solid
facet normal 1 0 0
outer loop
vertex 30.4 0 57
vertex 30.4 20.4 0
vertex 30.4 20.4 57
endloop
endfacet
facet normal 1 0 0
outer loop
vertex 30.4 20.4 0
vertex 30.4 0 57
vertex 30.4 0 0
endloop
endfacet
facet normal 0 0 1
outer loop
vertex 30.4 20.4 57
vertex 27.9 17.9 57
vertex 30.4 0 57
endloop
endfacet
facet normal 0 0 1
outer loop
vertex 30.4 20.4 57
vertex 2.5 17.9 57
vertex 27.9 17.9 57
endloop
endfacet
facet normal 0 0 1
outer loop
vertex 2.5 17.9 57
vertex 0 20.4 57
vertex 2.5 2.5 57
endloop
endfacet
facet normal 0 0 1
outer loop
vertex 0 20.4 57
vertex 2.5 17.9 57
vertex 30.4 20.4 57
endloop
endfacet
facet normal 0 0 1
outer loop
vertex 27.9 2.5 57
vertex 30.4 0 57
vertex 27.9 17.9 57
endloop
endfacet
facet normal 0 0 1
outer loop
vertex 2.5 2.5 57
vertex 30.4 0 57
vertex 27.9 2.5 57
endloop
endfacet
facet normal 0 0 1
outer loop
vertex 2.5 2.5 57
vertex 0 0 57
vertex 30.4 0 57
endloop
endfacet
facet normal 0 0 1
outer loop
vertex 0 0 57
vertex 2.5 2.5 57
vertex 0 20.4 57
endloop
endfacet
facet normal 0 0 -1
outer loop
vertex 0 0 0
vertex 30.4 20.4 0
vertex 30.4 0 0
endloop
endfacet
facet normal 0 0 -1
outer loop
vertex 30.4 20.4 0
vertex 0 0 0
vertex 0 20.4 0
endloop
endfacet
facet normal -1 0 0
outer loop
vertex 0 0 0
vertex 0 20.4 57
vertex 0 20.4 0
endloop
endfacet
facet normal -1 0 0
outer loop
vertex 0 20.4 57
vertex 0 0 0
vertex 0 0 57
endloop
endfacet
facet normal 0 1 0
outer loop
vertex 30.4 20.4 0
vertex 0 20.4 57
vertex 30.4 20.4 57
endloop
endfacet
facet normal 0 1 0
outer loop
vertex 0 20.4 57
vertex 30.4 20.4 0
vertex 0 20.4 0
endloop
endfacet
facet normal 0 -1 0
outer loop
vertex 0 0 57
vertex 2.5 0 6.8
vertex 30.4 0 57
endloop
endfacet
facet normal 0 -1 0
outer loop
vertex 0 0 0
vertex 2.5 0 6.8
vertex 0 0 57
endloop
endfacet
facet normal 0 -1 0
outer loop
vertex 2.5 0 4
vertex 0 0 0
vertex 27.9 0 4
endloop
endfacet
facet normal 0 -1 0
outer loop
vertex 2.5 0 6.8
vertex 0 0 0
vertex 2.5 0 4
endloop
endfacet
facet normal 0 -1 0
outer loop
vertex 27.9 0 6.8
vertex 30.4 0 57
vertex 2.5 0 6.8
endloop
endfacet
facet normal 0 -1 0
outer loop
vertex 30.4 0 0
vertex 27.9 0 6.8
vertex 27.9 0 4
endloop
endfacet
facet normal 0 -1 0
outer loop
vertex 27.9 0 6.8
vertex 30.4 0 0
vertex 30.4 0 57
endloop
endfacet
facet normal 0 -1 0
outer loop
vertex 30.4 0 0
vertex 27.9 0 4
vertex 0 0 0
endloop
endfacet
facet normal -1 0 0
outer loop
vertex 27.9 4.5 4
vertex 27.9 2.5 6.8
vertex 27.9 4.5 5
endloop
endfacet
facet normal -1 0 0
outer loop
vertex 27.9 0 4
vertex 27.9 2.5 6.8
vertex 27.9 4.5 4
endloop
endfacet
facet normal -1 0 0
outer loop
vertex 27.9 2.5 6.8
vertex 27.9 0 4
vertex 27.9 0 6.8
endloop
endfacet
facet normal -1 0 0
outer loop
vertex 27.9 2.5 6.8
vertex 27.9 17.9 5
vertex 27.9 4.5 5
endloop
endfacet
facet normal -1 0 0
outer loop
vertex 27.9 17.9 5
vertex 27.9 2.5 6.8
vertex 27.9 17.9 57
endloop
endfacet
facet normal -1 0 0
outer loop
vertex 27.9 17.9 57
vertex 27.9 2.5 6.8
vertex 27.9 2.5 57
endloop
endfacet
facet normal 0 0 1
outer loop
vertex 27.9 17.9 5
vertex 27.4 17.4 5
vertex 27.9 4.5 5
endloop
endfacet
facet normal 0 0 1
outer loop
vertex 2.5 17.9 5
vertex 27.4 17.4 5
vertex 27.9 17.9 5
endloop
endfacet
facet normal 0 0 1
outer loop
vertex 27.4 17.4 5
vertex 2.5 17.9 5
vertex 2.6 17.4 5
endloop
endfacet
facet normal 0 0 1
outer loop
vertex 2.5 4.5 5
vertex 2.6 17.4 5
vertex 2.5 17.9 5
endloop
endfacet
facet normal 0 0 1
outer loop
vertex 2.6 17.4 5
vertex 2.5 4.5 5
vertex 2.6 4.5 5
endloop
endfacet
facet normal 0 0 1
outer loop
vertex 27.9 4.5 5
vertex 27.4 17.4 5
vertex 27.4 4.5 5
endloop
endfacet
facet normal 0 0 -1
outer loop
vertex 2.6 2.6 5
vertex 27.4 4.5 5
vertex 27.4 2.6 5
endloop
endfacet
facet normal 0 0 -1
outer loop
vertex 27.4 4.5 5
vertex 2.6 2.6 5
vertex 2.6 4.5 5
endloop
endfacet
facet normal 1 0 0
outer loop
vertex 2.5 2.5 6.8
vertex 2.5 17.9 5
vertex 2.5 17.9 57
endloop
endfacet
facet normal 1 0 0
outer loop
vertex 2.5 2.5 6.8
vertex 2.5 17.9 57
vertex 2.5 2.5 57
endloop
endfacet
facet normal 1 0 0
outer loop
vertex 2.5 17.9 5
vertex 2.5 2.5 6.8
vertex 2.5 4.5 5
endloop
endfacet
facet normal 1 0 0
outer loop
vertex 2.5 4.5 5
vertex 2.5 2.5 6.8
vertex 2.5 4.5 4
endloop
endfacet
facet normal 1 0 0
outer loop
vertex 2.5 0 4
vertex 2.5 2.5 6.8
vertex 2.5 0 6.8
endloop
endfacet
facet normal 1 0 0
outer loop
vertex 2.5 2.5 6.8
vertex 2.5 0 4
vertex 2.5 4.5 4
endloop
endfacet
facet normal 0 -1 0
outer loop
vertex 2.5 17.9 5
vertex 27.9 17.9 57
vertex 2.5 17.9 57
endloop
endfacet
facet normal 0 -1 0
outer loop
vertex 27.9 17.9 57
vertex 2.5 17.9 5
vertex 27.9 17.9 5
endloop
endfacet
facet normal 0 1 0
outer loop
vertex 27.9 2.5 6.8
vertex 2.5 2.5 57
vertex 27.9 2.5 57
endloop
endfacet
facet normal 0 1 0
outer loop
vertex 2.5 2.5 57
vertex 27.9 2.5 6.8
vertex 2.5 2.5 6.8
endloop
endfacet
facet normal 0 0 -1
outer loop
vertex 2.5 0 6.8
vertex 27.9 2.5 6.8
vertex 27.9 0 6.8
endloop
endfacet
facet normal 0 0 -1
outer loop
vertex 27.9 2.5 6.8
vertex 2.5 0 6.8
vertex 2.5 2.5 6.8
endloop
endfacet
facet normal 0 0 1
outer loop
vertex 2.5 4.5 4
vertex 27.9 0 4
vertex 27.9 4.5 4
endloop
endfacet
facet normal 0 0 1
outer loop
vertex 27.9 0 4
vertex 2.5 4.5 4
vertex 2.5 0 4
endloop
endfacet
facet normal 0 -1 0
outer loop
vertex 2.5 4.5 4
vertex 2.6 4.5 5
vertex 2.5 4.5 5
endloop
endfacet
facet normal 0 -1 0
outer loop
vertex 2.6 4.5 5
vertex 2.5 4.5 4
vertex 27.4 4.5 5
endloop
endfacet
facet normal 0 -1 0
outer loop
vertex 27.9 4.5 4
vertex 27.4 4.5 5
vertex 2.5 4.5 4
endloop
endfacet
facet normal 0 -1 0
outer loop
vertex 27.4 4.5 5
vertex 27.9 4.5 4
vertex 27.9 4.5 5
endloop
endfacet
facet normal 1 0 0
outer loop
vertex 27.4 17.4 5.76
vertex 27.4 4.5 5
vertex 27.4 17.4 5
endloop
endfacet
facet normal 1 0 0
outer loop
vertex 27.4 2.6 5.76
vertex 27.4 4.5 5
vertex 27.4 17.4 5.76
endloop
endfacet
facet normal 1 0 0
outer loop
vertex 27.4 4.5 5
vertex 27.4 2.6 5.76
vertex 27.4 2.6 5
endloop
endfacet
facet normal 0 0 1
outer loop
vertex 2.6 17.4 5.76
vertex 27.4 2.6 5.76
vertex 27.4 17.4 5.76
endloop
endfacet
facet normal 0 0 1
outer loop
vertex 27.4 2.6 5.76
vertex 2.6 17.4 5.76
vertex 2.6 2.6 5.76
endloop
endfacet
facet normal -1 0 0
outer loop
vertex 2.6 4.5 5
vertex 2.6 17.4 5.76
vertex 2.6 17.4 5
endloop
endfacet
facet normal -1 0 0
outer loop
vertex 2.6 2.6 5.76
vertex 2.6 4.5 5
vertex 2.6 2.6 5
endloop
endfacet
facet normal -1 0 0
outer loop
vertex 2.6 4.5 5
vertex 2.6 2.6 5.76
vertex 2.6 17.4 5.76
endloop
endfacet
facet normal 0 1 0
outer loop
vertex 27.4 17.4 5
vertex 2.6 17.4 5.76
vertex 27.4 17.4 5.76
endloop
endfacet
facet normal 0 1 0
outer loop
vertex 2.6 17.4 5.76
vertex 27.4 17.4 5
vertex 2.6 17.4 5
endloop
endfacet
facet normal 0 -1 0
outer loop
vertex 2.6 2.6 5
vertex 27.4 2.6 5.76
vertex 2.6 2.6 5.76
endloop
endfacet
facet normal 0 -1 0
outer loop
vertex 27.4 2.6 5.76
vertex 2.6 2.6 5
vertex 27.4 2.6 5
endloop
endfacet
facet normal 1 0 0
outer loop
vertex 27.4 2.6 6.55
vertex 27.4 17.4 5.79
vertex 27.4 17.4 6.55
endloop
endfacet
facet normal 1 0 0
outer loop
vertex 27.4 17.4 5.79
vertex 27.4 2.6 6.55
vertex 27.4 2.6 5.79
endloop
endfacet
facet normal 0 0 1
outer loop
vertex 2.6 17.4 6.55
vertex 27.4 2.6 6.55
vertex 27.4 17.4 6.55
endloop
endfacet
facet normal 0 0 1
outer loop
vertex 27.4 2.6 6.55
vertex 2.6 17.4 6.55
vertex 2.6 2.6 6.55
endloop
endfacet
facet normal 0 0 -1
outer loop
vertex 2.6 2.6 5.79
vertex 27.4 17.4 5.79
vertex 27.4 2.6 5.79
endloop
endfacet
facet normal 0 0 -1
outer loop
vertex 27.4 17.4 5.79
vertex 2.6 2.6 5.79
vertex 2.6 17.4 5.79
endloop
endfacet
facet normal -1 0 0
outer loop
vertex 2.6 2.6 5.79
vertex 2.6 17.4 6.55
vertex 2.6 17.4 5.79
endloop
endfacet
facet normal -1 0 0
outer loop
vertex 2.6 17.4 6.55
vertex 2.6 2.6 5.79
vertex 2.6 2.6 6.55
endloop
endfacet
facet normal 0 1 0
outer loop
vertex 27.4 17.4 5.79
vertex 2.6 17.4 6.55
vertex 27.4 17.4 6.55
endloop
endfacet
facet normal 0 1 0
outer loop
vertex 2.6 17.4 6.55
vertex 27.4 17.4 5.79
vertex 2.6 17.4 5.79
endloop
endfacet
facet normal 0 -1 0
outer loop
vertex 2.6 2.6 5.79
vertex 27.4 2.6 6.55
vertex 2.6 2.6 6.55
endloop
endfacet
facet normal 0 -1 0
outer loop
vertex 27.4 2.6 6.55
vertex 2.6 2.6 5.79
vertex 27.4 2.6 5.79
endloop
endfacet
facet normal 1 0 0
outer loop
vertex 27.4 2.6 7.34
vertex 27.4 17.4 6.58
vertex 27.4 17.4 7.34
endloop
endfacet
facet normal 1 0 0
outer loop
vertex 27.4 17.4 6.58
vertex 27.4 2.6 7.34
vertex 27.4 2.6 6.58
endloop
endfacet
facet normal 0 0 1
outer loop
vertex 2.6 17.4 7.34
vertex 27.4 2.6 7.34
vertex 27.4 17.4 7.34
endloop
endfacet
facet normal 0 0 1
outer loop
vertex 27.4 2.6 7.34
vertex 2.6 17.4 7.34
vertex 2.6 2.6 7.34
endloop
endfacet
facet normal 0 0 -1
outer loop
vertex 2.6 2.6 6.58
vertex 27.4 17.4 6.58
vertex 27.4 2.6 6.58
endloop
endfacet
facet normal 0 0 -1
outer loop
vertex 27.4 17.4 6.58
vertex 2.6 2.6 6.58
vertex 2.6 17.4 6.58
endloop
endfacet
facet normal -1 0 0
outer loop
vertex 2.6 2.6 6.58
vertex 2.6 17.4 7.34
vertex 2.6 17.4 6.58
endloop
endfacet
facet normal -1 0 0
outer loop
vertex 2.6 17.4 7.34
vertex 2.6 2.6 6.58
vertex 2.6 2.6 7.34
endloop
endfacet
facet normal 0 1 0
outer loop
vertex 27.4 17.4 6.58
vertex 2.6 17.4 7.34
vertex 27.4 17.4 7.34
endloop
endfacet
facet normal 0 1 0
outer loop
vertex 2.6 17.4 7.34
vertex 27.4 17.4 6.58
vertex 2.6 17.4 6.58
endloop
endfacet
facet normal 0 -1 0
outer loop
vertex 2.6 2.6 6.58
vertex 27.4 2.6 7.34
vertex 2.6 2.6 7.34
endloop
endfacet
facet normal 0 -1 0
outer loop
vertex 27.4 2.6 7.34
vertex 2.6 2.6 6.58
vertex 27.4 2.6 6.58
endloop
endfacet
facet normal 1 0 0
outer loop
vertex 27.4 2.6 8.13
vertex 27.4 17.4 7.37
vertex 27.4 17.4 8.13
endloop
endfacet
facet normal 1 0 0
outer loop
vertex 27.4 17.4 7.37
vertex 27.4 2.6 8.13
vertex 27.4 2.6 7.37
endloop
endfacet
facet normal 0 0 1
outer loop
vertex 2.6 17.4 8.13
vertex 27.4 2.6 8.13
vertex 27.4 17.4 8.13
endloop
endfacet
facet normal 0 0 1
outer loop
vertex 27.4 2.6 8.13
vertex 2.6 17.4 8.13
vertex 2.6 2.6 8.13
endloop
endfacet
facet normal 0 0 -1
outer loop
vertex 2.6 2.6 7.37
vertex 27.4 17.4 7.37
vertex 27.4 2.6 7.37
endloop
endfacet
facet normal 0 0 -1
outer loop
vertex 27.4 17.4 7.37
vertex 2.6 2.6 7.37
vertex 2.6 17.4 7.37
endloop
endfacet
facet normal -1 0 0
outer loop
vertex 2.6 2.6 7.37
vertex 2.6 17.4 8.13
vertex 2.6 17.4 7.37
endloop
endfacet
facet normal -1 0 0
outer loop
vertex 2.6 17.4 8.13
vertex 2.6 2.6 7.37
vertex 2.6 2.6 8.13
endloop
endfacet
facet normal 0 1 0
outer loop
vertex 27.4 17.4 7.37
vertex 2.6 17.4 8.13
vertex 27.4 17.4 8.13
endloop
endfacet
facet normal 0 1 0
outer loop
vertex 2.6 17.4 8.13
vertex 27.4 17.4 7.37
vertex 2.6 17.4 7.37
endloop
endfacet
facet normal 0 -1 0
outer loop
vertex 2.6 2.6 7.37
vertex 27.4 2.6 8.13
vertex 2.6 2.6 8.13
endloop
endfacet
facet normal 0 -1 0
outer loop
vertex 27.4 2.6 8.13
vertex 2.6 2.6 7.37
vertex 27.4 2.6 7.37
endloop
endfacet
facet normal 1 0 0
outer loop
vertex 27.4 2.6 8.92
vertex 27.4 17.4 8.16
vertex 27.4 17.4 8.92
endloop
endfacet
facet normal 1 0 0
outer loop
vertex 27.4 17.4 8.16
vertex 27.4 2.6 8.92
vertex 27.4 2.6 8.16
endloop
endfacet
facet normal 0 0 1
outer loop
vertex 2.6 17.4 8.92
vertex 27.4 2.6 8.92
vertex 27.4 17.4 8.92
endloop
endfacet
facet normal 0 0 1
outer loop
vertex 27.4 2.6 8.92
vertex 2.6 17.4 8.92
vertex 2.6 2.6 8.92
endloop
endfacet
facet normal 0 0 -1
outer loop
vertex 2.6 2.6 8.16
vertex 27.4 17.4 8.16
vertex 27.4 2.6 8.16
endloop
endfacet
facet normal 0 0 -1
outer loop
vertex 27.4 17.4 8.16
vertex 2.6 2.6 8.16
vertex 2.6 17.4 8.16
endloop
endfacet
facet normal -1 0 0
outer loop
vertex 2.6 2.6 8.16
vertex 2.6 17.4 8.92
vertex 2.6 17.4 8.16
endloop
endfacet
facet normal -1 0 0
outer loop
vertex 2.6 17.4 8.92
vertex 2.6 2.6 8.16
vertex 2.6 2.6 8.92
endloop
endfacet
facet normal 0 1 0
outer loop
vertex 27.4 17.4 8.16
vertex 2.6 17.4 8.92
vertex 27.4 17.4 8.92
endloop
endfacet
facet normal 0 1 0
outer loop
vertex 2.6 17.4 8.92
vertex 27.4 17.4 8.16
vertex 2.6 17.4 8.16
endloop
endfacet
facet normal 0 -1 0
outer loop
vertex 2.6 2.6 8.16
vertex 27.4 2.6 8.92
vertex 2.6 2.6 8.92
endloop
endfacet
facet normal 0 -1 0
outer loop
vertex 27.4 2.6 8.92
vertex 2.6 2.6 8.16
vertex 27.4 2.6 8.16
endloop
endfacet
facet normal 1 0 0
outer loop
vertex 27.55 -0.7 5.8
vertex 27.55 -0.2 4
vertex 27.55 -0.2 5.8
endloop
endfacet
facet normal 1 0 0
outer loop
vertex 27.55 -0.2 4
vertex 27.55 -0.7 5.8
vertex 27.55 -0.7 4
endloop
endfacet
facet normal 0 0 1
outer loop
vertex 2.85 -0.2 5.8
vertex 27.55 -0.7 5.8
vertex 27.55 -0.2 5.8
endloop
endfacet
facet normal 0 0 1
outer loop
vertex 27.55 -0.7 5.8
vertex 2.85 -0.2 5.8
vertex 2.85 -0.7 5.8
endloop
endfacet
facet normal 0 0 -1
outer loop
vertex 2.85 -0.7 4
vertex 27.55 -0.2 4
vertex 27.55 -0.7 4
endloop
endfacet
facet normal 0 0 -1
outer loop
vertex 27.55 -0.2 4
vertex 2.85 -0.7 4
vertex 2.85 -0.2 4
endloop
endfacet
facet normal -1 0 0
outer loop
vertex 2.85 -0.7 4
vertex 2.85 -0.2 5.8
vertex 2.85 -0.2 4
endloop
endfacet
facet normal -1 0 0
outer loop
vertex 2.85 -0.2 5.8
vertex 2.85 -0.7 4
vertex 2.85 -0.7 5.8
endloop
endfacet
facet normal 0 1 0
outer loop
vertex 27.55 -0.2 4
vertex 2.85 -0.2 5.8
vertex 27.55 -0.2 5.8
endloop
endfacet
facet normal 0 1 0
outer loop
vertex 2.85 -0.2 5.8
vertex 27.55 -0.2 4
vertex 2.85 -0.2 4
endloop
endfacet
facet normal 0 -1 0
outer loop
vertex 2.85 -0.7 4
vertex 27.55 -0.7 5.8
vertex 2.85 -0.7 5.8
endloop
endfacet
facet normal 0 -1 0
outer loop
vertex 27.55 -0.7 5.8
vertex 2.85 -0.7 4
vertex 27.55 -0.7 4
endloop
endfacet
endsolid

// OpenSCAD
// Mini-SIM gravity tube - parametric
// Units: mm
$fn = 64;

N_CARDS = 50;
card_w = 25.0;    // longer side
card_d = 15.0;    // short side
card_t = 0.76;

clearance_side = 0.2;    // each side
inner_w = card_w + 2*clearance_side; // 25.4
inner_d = card_d + 2*clearance_side; // 15.4

wall = 2.5;
slot_h = 0.8;   // slot height
pusher_thk = 0.5;
pusher_width = inner_w - 0.7;
stroke = card_d + 1.0; // push distance (16.0)

stack_h = N_CARDS*card_t + N_CARDS*0.03 + 5; // small inter-card gap + headroom

// Body
translate([0,0,0])
difference() {
  // outer box
  translate([0,0,0])
    cube([inner_w + 2*wall, inner_d + 2*wall, stack_h + wall + 10], center=false);

  // internal cavity
  translate([wall, wall, 5])
    cube([inner_w, inner_d, stack_h], center=false);

  // bottom slot cutout (on front face)
  translate([wall, -1, 4]) {
    cube([inner_w, 3 + wall, slot_h + 2], center=false);
  }

  // top opening (for loading)
  translate([wall, wall, stack_h + 5])
    cube([inner_w, inner_d, 20], center=false);
}

// Pusher (visual)
translate([wall + (inner_w - pusher_width)/2, - (pusher_thk + 0.2), 4])
    cube([pusher_width, pusher_thk, slot_h + 1], center=false);

// optional: show a few cards in stack for scale
for (i = [0:4]) {
  translate([wall + 0.1, wall + 0.1, 5 + i*(card_t + 0.03)])
    cube([card_w - 0.2, card_d - 0.2, card_t], center=false);
}
